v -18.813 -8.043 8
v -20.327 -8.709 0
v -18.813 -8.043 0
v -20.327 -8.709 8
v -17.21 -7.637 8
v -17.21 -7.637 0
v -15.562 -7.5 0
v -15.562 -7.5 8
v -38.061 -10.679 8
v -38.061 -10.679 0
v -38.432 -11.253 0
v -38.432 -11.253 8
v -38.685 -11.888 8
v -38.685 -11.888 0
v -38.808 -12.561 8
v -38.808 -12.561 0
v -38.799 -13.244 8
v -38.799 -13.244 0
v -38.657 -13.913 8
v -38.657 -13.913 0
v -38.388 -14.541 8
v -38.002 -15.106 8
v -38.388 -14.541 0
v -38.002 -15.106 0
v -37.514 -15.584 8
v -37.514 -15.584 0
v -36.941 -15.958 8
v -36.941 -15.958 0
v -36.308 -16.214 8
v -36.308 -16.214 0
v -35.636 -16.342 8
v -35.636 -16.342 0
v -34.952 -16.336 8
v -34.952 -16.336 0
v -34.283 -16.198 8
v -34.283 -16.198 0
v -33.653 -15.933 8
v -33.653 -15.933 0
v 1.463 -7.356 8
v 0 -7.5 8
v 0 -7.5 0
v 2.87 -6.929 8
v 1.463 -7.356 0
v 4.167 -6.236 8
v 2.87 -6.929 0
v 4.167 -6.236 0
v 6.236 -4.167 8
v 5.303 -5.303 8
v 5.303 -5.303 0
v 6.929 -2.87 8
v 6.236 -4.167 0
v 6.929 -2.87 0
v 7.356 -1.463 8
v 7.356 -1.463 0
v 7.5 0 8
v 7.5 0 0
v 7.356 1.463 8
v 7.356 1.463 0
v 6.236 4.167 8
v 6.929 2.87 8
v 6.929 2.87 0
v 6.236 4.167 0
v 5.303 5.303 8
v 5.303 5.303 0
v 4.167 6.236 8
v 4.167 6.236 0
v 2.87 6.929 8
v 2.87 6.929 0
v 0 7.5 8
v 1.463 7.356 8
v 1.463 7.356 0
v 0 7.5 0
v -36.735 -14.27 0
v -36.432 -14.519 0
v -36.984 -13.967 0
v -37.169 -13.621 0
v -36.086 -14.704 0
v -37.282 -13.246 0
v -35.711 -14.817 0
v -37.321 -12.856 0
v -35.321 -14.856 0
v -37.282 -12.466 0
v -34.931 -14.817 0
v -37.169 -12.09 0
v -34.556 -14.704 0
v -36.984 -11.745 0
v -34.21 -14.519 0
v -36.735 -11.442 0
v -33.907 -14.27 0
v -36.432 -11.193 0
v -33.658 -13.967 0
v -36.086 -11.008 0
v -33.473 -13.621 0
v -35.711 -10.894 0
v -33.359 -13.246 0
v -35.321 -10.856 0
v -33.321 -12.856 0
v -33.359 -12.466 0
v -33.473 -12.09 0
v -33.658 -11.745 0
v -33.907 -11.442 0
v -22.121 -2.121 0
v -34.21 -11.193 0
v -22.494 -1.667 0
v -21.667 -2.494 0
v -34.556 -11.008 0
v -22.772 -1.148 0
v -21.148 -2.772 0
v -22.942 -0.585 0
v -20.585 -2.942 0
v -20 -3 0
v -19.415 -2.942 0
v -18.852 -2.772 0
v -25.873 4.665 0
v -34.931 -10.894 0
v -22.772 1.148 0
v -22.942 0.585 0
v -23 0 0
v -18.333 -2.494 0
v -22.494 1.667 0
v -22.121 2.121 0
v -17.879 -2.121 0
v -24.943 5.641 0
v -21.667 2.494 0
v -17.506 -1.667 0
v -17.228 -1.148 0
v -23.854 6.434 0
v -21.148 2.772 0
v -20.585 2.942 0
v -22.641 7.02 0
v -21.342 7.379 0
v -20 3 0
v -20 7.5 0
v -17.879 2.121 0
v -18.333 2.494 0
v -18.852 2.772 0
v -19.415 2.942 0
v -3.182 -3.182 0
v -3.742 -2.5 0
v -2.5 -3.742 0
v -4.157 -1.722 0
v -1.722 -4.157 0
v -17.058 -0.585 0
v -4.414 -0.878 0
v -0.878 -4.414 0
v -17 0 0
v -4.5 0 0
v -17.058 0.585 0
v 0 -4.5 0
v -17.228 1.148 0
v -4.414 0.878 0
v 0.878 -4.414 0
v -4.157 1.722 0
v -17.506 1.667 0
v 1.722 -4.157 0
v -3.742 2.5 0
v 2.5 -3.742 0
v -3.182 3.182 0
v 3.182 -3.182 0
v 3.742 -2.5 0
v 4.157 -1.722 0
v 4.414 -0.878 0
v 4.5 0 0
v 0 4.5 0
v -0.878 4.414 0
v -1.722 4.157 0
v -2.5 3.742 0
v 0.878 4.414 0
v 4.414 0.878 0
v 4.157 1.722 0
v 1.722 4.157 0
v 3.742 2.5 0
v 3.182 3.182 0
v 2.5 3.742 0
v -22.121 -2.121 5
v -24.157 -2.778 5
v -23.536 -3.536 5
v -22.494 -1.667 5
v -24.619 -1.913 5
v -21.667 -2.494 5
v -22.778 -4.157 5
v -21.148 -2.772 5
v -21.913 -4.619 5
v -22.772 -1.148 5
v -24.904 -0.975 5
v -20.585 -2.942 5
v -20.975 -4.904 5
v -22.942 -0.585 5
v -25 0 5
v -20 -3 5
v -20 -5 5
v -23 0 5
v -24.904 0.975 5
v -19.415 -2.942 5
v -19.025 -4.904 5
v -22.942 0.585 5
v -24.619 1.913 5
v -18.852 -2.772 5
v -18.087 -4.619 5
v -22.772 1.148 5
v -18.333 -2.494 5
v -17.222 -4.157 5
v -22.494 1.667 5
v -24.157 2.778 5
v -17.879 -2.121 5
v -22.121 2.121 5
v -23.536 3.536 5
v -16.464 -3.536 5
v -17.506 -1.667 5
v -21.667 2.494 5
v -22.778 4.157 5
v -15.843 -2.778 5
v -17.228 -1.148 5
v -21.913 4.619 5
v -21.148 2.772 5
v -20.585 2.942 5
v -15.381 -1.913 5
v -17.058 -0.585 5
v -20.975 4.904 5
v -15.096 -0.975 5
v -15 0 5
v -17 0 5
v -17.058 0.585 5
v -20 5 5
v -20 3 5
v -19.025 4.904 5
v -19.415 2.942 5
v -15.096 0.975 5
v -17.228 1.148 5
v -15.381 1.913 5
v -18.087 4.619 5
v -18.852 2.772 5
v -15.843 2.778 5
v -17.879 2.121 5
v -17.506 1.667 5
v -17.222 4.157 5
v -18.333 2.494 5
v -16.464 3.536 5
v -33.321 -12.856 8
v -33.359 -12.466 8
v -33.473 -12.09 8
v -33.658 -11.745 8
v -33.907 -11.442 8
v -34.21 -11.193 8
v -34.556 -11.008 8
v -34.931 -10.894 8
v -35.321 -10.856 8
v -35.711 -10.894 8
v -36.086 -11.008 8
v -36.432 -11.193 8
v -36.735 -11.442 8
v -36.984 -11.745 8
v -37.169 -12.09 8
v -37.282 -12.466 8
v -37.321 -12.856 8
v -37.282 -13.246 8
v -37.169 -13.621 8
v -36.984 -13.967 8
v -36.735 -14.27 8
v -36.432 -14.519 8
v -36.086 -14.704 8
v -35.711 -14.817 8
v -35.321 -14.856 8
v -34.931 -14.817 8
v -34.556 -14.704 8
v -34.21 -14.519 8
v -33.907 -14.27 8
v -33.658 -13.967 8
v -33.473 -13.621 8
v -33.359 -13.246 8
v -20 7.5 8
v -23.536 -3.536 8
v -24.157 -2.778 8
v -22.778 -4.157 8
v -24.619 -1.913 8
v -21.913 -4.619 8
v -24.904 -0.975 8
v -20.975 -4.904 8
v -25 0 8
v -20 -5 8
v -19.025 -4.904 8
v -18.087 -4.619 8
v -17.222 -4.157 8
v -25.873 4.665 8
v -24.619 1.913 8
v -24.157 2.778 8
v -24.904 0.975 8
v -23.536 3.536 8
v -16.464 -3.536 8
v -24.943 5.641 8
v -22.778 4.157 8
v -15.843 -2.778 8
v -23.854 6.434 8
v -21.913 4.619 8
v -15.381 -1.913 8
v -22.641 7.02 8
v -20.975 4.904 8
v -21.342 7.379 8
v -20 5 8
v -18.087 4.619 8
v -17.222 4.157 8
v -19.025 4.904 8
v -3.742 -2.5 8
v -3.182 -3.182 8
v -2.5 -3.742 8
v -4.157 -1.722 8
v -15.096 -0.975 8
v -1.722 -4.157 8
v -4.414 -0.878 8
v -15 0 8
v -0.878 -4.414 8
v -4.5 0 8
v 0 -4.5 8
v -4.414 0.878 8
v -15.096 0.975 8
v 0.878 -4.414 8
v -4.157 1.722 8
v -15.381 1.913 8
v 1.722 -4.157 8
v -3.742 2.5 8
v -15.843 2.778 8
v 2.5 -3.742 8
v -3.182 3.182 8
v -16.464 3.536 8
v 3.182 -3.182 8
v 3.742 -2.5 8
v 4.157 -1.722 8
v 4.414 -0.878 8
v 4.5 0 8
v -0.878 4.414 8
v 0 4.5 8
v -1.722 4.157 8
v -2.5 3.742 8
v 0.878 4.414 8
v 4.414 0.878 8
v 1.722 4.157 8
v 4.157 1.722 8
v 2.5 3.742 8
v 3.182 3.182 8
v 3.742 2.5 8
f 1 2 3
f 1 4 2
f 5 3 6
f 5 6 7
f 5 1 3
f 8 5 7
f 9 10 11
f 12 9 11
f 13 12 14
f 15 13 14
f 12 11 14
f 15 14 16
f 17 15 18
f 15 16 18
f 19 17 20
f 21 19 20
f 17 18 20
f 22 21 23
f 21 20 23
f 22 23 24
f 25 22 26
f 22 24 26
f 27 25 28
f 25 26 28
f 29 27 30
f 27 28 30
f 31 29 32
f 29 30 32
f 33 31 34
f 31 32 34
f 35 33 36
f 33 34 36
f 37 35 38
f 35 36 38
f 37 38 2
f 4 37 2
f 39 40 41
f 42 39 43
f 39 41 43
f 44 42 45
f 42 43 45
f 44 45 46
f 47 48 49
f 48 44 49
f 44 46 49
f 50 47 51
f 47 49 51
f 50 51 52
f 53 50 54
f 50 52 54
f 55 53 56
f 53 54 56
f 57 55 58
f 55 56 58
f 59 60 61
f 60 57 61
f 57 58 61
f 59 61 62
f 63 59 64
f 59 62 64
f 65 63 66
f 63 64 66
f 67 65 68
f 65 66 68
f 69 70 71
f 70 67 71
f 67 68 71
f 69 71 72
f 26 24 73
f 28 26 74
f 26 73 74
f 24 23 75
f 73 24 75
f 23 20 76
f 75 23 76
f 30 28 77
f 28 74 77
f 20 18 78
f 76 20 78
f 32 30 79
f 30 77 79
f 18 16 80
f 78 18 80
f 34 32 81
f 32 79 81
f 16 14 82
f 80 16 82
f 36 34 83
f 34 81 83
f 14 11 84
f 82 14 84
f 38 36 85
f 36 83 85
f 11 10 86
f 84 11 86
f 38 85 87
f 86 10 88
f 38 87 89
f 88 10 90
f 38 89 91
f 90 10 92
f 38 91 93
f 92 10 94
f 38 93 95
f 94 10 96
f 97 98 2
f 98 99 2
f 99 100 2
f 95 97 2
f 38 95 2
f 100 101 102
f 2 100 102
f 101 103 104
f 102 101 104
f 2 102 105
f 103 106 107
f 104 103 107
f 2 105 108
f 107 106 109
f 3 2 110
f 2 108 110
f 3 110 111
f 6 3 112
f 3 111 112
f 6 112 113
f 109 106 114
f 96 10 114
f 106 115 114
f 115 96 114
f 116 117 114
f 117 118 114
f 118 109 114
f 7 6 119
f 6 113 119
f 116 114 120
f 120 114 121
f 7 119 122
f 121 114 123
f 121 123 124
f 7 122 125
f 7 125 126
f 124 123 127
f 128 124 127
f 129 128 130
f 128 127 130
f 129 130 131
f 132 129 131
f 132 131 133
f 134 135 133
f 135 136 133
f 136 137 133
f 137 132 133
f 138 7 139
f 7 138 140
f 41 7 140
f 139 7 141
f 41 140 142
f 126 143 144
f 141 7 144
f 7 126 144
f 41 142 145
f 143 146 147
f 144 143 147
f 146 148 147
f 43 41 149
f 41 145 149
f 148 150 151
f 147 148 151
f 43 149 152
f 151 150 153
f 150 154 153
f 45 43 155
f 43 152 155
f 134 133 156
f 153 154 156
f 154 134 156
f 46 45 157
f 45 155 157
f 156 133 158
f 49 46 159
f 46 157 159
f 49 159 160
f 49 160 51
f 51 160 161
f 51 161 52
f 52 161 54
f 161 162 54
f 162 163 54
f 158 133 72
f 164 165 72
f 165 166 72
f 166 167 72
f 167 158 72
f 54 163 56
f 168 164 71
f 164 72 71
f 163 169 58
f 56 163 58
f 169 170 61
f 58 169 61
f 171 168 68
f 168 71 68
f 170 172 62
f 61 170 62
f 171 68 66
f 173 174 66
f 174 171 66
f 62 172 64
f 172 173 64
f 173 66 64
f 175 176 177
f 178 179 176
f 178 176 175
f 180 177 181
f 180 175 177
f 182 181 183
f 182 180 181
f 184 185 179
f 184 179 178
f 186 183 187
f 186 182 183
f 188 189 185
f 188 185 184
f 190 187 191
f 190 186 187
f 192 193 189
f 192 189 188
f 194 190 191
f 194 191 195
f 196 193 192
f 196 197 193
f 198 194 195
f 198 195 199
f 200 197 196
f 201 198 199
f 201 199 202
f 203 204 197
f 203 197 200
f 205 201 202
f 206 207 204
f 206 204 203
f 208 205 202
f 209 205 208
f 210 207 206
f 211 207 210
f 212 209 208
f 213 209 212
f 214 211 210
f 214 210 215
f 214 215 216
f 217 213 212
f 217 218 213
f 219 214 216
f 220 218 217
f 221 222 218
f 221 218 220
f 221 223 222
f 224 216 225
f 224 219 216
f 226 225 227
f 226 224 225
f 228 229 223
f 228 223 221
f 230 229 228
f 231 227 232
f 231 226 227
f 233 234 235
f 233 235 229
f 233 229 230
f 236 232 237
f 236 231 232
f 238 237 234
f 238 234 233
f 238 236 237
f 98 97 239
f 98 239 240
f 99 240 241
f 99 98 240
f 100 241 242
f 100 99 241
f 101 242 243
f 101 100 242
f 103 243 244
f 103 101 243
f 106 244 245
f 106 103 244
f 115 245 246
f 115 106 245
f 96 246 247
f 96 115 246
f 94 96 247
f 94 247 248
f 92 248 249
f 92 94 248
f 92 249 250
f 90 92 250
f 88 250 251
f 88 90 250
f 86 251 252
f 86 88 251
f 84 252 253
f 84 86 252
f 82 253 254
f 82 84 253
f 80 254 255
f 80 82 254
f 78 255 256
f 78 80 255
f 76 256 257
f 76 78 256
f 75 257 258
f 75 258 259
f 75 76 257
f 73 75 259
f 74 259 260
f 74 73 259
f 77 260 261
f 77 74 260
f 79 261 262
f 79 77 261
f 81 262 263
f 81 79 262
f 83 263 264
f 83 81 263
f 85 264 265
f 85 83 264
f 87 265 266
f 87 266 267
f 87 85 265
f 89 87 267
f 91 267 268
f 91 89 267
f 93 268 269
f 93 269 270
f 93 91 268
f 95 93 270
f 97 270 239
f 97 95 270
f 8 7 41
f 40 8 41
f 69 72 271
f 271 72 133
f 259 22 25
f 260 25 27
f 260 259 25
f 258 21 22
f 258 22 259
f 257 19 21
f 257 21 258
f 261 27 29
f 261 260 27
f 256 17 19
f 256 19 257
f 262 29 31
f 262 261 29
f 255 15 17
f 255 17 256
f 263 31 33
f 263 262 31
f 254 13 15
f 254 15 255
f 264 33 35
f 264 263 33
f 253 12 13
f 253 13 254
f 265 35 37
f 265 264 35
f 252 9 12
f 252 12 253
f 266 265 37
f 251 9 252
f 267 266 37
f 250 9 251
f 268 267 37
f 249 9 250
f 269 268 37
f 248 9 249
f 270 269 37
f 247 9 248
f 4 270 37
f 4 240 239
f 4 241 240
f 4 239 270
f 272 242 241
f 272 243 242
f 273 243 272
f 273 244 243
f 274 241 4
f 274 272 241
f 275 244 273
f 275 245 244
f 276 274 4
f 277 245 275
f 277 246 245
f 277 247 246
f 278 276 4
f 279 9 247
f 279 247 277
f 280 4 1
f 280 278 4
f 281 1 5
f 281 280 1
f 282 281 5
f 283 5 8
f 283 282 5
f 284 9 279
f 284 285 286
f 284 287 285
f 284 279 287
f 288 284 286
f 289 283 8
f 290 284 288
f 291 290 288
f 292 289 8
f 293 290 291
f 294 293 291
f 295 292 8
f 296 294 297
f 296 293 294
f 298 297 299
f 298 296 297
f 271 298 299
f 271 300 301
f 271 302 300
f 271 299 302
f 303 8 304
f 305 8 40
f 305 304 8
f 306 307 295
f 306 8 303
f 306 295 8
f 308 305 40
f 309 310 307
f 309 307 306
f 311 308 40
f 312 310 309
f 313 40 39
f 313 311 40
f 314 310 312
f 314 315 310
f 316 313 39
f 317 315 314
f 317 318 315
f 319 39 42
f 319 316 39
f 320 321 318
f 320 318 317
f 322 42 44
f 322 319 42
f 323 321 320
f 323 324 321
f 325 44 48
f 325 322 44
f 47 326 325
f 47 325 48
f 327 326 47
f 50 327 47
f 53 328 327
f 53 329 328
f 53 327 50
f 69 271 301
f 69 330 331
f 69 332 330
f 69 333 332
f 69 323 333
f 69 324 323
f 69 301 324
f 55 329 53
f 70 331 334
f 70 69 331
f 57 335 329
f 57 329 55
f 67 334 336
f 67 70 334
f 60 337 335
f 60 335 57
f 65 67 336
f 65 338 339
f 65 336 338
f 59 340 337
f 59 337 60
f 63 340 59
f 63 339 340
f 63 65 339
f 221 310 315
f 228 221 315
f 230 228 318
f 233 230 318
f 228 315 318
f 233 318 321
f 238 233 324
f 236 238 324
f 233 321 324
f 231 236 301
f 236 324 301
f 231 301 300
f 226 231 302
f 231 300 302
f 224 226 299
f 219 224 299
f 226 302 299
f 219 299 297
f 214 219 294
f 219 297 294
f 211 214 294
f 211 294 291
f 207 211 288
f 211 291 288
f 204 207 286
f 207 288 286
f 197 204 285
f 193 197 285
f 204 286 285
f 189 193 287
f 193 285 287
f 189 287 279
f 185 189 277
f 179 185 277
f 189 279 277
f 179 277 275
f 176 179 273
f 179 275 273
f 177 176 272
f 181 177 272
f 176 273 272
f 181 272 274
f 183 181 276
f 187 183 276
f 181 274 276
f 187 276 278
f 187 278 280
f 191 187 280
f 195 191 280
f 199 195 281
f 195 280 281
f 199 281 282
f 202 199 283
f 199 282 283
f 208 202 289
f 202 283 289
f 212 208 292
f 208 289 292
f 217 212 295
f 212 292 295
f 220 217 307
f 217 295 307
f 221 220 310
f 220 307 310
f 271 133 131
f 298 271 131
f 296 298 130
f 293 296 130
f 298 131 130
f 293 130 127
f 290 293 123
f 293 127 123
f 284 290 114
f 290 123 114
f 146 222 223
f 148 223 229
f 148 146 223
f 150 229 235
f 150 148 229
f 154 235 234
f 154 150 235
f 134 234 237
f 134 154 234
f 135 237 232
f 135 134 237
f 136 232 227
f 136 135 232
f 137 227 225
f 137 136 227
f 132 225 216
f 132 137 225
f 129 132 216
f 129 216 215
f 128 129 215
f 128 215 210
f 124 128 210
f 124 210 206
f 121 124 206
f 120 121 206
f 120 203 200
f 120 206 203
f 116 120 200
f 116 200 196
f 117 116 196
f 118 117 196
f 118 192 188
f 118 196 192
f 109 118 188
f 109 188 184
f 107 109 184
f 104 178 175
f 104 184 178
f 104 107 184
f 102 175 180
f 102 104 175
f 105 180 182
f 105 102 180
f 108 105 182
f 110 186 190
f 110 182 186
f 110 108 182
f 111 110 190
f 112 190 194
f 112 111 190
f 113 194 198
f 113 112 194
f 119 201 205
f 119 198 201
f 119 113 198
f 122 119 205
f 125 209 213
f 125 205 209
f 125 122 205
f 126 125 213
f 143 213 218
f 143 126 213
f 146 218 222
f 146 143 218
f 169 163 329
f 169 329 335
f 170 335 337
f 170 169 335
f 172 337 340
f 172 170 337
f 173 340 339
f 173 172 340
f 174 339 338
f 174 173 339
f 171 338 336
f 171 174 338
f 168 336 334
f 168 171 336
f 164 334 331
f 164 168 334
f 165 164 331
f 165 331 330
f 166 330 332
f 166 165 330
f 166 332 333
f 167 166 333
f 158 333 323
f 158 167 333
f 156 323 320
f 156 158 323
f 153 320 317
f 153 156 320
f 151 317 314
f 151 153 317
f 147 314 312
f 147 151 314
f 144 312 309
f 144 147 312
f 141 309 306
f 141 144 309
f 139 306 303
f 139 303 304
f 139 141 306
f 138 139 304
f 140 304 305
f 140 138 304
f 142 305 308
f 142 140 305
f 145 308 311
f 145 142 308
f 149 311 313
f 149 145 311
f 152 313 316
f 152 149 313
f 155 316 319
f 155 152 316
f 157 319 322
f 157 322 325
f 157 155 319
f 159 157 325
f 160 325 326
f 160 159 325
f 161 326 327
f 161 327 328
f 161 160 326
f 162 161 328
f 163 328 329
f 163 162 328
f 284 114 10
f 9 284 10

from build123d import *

# Parameters (mm, degrees)
SKETCH_1_R          = 3.5
SKETCH_1_R_2        = 2
SKETCH_1_R_3        = 7.5
SKETCH_1_R_4        = 3
SKETCH_1_R_5        = 4.5
EXTRUDE_1_DEPTH     = 8
FILLET_1_R          = 10
SKETCH_2_R          = 5
CUT_EXTRUDE_1_DEPTH = 3


with BuildPart() as part:
    # Эскиз1 → Бобышка-Вытянуть1 (new body)
    # profile 1 of 6: a face of its own
    with BuildSketch(Plane.XY):
        with Locations((-35.320888862, -12.855752194)):
            Circle(SKETCH_1_R)
        with Locations((-35.320888862, -12.855752194)):
            Circle(SKETCH_1_R_2, mode=Mode.SUBTRACT)
    # profile 2 of 6: a face of its own
    with BuildSketch(Plane.XY):
        with BuildLine():
            ThreePointArc((-20, -7.5), (-26.754185537, -3.260518017), (-25.872571635, 4.665072603))
            Line((-25.872571635, 4.665072603), (-38.061422292, -10.678718312))
            ThreePointArc((-38.061422292, -10.678718312), (-34.168037398, -9.551068623), (-31.820888862, -12.855752194))
            ThreePointArc((-31.820888862, -12.855752194), (-32.313543751, -14.646248042), (-33.652817653, -15.932688729))
            Line((-33.652817653, -15.932688729), (-18.097817426, -7.5))
            Line((-18.097817426, -7.5), (-20, -7.5))
        make_face()
    # profile 3 of 6: a face of its own
    with BuildSketch(Plane.XY):
        with Locations((-20, 0)):
            Circle(SKETCH_1_R_3)
        with Locations((-20, 0)):
            Circle(SKETCH_1_R_4, mode=Mode.SUBTRACT)
    # profile 4 of 6: a face of its own
    with BuildSketch(Plane.XY):
        with BuildLine():
            Line((-20, -7.5), (-18.097817426, -7.5))
            Line((-18.097817426, -7.5), (-16.425561695, -6.593435432))
            ThreePointArc((-16.425561695, -6.593435432), (-18.156194932, -7.26982688), (-20, -7.5))
        make_face()
    # profile 5 of 6: a face of its own
    with BuildSketch(Plane.XY):
        with BuildLine():
            ThreePointArc((0, -7.5), (-7.5, 0), (0, 7.5))
            Line((0, 7.5), (-20, 7.5))
            ThreePointArc((-20, 7.5), (-14.696699141, 5.303300859), (-12.5, 0))
            ThreePointArc((-12.5, 0), (-13.555689048, -3.836776818), (-16.425561695, -6.593435432))
            Line((-16.425561695, -6.593435432), (-18.097817426, -7.5))
            Line((-18.097817426, -7.5), (0, -7.5))
        make_face()
    # profile 6 of 6: a face of its own
    with BuildSketch(Plane.XY):
        Circle(SKETCH_1_R_3)
        Circle(SKETCH_1_R_5, mode=Mode.SUBTRACT)
    extrude(amount=EXTRUDE_1_DEPTH)

    # Скругление1
    fillet_1_edges = [part.edges().sort_by_distance(p)[0] for p in [
        (-18.097817426, -7.5, 4),
    ]]
    fillet(fillet_1_edges, radius=FILLET_1_R)

    # Эскиз2 → Вырез-Вытянуть1 (cut)
    with BuildSketch(Plane.XY.offset(8)):
        with Locations((-20, 0)):
            Circle(SKETCH_2_R)
    extrude(amount=-CUT_EXTRUDE_1_DEPTH, mode=Mode.SUBTRACT)


solid = part.part
